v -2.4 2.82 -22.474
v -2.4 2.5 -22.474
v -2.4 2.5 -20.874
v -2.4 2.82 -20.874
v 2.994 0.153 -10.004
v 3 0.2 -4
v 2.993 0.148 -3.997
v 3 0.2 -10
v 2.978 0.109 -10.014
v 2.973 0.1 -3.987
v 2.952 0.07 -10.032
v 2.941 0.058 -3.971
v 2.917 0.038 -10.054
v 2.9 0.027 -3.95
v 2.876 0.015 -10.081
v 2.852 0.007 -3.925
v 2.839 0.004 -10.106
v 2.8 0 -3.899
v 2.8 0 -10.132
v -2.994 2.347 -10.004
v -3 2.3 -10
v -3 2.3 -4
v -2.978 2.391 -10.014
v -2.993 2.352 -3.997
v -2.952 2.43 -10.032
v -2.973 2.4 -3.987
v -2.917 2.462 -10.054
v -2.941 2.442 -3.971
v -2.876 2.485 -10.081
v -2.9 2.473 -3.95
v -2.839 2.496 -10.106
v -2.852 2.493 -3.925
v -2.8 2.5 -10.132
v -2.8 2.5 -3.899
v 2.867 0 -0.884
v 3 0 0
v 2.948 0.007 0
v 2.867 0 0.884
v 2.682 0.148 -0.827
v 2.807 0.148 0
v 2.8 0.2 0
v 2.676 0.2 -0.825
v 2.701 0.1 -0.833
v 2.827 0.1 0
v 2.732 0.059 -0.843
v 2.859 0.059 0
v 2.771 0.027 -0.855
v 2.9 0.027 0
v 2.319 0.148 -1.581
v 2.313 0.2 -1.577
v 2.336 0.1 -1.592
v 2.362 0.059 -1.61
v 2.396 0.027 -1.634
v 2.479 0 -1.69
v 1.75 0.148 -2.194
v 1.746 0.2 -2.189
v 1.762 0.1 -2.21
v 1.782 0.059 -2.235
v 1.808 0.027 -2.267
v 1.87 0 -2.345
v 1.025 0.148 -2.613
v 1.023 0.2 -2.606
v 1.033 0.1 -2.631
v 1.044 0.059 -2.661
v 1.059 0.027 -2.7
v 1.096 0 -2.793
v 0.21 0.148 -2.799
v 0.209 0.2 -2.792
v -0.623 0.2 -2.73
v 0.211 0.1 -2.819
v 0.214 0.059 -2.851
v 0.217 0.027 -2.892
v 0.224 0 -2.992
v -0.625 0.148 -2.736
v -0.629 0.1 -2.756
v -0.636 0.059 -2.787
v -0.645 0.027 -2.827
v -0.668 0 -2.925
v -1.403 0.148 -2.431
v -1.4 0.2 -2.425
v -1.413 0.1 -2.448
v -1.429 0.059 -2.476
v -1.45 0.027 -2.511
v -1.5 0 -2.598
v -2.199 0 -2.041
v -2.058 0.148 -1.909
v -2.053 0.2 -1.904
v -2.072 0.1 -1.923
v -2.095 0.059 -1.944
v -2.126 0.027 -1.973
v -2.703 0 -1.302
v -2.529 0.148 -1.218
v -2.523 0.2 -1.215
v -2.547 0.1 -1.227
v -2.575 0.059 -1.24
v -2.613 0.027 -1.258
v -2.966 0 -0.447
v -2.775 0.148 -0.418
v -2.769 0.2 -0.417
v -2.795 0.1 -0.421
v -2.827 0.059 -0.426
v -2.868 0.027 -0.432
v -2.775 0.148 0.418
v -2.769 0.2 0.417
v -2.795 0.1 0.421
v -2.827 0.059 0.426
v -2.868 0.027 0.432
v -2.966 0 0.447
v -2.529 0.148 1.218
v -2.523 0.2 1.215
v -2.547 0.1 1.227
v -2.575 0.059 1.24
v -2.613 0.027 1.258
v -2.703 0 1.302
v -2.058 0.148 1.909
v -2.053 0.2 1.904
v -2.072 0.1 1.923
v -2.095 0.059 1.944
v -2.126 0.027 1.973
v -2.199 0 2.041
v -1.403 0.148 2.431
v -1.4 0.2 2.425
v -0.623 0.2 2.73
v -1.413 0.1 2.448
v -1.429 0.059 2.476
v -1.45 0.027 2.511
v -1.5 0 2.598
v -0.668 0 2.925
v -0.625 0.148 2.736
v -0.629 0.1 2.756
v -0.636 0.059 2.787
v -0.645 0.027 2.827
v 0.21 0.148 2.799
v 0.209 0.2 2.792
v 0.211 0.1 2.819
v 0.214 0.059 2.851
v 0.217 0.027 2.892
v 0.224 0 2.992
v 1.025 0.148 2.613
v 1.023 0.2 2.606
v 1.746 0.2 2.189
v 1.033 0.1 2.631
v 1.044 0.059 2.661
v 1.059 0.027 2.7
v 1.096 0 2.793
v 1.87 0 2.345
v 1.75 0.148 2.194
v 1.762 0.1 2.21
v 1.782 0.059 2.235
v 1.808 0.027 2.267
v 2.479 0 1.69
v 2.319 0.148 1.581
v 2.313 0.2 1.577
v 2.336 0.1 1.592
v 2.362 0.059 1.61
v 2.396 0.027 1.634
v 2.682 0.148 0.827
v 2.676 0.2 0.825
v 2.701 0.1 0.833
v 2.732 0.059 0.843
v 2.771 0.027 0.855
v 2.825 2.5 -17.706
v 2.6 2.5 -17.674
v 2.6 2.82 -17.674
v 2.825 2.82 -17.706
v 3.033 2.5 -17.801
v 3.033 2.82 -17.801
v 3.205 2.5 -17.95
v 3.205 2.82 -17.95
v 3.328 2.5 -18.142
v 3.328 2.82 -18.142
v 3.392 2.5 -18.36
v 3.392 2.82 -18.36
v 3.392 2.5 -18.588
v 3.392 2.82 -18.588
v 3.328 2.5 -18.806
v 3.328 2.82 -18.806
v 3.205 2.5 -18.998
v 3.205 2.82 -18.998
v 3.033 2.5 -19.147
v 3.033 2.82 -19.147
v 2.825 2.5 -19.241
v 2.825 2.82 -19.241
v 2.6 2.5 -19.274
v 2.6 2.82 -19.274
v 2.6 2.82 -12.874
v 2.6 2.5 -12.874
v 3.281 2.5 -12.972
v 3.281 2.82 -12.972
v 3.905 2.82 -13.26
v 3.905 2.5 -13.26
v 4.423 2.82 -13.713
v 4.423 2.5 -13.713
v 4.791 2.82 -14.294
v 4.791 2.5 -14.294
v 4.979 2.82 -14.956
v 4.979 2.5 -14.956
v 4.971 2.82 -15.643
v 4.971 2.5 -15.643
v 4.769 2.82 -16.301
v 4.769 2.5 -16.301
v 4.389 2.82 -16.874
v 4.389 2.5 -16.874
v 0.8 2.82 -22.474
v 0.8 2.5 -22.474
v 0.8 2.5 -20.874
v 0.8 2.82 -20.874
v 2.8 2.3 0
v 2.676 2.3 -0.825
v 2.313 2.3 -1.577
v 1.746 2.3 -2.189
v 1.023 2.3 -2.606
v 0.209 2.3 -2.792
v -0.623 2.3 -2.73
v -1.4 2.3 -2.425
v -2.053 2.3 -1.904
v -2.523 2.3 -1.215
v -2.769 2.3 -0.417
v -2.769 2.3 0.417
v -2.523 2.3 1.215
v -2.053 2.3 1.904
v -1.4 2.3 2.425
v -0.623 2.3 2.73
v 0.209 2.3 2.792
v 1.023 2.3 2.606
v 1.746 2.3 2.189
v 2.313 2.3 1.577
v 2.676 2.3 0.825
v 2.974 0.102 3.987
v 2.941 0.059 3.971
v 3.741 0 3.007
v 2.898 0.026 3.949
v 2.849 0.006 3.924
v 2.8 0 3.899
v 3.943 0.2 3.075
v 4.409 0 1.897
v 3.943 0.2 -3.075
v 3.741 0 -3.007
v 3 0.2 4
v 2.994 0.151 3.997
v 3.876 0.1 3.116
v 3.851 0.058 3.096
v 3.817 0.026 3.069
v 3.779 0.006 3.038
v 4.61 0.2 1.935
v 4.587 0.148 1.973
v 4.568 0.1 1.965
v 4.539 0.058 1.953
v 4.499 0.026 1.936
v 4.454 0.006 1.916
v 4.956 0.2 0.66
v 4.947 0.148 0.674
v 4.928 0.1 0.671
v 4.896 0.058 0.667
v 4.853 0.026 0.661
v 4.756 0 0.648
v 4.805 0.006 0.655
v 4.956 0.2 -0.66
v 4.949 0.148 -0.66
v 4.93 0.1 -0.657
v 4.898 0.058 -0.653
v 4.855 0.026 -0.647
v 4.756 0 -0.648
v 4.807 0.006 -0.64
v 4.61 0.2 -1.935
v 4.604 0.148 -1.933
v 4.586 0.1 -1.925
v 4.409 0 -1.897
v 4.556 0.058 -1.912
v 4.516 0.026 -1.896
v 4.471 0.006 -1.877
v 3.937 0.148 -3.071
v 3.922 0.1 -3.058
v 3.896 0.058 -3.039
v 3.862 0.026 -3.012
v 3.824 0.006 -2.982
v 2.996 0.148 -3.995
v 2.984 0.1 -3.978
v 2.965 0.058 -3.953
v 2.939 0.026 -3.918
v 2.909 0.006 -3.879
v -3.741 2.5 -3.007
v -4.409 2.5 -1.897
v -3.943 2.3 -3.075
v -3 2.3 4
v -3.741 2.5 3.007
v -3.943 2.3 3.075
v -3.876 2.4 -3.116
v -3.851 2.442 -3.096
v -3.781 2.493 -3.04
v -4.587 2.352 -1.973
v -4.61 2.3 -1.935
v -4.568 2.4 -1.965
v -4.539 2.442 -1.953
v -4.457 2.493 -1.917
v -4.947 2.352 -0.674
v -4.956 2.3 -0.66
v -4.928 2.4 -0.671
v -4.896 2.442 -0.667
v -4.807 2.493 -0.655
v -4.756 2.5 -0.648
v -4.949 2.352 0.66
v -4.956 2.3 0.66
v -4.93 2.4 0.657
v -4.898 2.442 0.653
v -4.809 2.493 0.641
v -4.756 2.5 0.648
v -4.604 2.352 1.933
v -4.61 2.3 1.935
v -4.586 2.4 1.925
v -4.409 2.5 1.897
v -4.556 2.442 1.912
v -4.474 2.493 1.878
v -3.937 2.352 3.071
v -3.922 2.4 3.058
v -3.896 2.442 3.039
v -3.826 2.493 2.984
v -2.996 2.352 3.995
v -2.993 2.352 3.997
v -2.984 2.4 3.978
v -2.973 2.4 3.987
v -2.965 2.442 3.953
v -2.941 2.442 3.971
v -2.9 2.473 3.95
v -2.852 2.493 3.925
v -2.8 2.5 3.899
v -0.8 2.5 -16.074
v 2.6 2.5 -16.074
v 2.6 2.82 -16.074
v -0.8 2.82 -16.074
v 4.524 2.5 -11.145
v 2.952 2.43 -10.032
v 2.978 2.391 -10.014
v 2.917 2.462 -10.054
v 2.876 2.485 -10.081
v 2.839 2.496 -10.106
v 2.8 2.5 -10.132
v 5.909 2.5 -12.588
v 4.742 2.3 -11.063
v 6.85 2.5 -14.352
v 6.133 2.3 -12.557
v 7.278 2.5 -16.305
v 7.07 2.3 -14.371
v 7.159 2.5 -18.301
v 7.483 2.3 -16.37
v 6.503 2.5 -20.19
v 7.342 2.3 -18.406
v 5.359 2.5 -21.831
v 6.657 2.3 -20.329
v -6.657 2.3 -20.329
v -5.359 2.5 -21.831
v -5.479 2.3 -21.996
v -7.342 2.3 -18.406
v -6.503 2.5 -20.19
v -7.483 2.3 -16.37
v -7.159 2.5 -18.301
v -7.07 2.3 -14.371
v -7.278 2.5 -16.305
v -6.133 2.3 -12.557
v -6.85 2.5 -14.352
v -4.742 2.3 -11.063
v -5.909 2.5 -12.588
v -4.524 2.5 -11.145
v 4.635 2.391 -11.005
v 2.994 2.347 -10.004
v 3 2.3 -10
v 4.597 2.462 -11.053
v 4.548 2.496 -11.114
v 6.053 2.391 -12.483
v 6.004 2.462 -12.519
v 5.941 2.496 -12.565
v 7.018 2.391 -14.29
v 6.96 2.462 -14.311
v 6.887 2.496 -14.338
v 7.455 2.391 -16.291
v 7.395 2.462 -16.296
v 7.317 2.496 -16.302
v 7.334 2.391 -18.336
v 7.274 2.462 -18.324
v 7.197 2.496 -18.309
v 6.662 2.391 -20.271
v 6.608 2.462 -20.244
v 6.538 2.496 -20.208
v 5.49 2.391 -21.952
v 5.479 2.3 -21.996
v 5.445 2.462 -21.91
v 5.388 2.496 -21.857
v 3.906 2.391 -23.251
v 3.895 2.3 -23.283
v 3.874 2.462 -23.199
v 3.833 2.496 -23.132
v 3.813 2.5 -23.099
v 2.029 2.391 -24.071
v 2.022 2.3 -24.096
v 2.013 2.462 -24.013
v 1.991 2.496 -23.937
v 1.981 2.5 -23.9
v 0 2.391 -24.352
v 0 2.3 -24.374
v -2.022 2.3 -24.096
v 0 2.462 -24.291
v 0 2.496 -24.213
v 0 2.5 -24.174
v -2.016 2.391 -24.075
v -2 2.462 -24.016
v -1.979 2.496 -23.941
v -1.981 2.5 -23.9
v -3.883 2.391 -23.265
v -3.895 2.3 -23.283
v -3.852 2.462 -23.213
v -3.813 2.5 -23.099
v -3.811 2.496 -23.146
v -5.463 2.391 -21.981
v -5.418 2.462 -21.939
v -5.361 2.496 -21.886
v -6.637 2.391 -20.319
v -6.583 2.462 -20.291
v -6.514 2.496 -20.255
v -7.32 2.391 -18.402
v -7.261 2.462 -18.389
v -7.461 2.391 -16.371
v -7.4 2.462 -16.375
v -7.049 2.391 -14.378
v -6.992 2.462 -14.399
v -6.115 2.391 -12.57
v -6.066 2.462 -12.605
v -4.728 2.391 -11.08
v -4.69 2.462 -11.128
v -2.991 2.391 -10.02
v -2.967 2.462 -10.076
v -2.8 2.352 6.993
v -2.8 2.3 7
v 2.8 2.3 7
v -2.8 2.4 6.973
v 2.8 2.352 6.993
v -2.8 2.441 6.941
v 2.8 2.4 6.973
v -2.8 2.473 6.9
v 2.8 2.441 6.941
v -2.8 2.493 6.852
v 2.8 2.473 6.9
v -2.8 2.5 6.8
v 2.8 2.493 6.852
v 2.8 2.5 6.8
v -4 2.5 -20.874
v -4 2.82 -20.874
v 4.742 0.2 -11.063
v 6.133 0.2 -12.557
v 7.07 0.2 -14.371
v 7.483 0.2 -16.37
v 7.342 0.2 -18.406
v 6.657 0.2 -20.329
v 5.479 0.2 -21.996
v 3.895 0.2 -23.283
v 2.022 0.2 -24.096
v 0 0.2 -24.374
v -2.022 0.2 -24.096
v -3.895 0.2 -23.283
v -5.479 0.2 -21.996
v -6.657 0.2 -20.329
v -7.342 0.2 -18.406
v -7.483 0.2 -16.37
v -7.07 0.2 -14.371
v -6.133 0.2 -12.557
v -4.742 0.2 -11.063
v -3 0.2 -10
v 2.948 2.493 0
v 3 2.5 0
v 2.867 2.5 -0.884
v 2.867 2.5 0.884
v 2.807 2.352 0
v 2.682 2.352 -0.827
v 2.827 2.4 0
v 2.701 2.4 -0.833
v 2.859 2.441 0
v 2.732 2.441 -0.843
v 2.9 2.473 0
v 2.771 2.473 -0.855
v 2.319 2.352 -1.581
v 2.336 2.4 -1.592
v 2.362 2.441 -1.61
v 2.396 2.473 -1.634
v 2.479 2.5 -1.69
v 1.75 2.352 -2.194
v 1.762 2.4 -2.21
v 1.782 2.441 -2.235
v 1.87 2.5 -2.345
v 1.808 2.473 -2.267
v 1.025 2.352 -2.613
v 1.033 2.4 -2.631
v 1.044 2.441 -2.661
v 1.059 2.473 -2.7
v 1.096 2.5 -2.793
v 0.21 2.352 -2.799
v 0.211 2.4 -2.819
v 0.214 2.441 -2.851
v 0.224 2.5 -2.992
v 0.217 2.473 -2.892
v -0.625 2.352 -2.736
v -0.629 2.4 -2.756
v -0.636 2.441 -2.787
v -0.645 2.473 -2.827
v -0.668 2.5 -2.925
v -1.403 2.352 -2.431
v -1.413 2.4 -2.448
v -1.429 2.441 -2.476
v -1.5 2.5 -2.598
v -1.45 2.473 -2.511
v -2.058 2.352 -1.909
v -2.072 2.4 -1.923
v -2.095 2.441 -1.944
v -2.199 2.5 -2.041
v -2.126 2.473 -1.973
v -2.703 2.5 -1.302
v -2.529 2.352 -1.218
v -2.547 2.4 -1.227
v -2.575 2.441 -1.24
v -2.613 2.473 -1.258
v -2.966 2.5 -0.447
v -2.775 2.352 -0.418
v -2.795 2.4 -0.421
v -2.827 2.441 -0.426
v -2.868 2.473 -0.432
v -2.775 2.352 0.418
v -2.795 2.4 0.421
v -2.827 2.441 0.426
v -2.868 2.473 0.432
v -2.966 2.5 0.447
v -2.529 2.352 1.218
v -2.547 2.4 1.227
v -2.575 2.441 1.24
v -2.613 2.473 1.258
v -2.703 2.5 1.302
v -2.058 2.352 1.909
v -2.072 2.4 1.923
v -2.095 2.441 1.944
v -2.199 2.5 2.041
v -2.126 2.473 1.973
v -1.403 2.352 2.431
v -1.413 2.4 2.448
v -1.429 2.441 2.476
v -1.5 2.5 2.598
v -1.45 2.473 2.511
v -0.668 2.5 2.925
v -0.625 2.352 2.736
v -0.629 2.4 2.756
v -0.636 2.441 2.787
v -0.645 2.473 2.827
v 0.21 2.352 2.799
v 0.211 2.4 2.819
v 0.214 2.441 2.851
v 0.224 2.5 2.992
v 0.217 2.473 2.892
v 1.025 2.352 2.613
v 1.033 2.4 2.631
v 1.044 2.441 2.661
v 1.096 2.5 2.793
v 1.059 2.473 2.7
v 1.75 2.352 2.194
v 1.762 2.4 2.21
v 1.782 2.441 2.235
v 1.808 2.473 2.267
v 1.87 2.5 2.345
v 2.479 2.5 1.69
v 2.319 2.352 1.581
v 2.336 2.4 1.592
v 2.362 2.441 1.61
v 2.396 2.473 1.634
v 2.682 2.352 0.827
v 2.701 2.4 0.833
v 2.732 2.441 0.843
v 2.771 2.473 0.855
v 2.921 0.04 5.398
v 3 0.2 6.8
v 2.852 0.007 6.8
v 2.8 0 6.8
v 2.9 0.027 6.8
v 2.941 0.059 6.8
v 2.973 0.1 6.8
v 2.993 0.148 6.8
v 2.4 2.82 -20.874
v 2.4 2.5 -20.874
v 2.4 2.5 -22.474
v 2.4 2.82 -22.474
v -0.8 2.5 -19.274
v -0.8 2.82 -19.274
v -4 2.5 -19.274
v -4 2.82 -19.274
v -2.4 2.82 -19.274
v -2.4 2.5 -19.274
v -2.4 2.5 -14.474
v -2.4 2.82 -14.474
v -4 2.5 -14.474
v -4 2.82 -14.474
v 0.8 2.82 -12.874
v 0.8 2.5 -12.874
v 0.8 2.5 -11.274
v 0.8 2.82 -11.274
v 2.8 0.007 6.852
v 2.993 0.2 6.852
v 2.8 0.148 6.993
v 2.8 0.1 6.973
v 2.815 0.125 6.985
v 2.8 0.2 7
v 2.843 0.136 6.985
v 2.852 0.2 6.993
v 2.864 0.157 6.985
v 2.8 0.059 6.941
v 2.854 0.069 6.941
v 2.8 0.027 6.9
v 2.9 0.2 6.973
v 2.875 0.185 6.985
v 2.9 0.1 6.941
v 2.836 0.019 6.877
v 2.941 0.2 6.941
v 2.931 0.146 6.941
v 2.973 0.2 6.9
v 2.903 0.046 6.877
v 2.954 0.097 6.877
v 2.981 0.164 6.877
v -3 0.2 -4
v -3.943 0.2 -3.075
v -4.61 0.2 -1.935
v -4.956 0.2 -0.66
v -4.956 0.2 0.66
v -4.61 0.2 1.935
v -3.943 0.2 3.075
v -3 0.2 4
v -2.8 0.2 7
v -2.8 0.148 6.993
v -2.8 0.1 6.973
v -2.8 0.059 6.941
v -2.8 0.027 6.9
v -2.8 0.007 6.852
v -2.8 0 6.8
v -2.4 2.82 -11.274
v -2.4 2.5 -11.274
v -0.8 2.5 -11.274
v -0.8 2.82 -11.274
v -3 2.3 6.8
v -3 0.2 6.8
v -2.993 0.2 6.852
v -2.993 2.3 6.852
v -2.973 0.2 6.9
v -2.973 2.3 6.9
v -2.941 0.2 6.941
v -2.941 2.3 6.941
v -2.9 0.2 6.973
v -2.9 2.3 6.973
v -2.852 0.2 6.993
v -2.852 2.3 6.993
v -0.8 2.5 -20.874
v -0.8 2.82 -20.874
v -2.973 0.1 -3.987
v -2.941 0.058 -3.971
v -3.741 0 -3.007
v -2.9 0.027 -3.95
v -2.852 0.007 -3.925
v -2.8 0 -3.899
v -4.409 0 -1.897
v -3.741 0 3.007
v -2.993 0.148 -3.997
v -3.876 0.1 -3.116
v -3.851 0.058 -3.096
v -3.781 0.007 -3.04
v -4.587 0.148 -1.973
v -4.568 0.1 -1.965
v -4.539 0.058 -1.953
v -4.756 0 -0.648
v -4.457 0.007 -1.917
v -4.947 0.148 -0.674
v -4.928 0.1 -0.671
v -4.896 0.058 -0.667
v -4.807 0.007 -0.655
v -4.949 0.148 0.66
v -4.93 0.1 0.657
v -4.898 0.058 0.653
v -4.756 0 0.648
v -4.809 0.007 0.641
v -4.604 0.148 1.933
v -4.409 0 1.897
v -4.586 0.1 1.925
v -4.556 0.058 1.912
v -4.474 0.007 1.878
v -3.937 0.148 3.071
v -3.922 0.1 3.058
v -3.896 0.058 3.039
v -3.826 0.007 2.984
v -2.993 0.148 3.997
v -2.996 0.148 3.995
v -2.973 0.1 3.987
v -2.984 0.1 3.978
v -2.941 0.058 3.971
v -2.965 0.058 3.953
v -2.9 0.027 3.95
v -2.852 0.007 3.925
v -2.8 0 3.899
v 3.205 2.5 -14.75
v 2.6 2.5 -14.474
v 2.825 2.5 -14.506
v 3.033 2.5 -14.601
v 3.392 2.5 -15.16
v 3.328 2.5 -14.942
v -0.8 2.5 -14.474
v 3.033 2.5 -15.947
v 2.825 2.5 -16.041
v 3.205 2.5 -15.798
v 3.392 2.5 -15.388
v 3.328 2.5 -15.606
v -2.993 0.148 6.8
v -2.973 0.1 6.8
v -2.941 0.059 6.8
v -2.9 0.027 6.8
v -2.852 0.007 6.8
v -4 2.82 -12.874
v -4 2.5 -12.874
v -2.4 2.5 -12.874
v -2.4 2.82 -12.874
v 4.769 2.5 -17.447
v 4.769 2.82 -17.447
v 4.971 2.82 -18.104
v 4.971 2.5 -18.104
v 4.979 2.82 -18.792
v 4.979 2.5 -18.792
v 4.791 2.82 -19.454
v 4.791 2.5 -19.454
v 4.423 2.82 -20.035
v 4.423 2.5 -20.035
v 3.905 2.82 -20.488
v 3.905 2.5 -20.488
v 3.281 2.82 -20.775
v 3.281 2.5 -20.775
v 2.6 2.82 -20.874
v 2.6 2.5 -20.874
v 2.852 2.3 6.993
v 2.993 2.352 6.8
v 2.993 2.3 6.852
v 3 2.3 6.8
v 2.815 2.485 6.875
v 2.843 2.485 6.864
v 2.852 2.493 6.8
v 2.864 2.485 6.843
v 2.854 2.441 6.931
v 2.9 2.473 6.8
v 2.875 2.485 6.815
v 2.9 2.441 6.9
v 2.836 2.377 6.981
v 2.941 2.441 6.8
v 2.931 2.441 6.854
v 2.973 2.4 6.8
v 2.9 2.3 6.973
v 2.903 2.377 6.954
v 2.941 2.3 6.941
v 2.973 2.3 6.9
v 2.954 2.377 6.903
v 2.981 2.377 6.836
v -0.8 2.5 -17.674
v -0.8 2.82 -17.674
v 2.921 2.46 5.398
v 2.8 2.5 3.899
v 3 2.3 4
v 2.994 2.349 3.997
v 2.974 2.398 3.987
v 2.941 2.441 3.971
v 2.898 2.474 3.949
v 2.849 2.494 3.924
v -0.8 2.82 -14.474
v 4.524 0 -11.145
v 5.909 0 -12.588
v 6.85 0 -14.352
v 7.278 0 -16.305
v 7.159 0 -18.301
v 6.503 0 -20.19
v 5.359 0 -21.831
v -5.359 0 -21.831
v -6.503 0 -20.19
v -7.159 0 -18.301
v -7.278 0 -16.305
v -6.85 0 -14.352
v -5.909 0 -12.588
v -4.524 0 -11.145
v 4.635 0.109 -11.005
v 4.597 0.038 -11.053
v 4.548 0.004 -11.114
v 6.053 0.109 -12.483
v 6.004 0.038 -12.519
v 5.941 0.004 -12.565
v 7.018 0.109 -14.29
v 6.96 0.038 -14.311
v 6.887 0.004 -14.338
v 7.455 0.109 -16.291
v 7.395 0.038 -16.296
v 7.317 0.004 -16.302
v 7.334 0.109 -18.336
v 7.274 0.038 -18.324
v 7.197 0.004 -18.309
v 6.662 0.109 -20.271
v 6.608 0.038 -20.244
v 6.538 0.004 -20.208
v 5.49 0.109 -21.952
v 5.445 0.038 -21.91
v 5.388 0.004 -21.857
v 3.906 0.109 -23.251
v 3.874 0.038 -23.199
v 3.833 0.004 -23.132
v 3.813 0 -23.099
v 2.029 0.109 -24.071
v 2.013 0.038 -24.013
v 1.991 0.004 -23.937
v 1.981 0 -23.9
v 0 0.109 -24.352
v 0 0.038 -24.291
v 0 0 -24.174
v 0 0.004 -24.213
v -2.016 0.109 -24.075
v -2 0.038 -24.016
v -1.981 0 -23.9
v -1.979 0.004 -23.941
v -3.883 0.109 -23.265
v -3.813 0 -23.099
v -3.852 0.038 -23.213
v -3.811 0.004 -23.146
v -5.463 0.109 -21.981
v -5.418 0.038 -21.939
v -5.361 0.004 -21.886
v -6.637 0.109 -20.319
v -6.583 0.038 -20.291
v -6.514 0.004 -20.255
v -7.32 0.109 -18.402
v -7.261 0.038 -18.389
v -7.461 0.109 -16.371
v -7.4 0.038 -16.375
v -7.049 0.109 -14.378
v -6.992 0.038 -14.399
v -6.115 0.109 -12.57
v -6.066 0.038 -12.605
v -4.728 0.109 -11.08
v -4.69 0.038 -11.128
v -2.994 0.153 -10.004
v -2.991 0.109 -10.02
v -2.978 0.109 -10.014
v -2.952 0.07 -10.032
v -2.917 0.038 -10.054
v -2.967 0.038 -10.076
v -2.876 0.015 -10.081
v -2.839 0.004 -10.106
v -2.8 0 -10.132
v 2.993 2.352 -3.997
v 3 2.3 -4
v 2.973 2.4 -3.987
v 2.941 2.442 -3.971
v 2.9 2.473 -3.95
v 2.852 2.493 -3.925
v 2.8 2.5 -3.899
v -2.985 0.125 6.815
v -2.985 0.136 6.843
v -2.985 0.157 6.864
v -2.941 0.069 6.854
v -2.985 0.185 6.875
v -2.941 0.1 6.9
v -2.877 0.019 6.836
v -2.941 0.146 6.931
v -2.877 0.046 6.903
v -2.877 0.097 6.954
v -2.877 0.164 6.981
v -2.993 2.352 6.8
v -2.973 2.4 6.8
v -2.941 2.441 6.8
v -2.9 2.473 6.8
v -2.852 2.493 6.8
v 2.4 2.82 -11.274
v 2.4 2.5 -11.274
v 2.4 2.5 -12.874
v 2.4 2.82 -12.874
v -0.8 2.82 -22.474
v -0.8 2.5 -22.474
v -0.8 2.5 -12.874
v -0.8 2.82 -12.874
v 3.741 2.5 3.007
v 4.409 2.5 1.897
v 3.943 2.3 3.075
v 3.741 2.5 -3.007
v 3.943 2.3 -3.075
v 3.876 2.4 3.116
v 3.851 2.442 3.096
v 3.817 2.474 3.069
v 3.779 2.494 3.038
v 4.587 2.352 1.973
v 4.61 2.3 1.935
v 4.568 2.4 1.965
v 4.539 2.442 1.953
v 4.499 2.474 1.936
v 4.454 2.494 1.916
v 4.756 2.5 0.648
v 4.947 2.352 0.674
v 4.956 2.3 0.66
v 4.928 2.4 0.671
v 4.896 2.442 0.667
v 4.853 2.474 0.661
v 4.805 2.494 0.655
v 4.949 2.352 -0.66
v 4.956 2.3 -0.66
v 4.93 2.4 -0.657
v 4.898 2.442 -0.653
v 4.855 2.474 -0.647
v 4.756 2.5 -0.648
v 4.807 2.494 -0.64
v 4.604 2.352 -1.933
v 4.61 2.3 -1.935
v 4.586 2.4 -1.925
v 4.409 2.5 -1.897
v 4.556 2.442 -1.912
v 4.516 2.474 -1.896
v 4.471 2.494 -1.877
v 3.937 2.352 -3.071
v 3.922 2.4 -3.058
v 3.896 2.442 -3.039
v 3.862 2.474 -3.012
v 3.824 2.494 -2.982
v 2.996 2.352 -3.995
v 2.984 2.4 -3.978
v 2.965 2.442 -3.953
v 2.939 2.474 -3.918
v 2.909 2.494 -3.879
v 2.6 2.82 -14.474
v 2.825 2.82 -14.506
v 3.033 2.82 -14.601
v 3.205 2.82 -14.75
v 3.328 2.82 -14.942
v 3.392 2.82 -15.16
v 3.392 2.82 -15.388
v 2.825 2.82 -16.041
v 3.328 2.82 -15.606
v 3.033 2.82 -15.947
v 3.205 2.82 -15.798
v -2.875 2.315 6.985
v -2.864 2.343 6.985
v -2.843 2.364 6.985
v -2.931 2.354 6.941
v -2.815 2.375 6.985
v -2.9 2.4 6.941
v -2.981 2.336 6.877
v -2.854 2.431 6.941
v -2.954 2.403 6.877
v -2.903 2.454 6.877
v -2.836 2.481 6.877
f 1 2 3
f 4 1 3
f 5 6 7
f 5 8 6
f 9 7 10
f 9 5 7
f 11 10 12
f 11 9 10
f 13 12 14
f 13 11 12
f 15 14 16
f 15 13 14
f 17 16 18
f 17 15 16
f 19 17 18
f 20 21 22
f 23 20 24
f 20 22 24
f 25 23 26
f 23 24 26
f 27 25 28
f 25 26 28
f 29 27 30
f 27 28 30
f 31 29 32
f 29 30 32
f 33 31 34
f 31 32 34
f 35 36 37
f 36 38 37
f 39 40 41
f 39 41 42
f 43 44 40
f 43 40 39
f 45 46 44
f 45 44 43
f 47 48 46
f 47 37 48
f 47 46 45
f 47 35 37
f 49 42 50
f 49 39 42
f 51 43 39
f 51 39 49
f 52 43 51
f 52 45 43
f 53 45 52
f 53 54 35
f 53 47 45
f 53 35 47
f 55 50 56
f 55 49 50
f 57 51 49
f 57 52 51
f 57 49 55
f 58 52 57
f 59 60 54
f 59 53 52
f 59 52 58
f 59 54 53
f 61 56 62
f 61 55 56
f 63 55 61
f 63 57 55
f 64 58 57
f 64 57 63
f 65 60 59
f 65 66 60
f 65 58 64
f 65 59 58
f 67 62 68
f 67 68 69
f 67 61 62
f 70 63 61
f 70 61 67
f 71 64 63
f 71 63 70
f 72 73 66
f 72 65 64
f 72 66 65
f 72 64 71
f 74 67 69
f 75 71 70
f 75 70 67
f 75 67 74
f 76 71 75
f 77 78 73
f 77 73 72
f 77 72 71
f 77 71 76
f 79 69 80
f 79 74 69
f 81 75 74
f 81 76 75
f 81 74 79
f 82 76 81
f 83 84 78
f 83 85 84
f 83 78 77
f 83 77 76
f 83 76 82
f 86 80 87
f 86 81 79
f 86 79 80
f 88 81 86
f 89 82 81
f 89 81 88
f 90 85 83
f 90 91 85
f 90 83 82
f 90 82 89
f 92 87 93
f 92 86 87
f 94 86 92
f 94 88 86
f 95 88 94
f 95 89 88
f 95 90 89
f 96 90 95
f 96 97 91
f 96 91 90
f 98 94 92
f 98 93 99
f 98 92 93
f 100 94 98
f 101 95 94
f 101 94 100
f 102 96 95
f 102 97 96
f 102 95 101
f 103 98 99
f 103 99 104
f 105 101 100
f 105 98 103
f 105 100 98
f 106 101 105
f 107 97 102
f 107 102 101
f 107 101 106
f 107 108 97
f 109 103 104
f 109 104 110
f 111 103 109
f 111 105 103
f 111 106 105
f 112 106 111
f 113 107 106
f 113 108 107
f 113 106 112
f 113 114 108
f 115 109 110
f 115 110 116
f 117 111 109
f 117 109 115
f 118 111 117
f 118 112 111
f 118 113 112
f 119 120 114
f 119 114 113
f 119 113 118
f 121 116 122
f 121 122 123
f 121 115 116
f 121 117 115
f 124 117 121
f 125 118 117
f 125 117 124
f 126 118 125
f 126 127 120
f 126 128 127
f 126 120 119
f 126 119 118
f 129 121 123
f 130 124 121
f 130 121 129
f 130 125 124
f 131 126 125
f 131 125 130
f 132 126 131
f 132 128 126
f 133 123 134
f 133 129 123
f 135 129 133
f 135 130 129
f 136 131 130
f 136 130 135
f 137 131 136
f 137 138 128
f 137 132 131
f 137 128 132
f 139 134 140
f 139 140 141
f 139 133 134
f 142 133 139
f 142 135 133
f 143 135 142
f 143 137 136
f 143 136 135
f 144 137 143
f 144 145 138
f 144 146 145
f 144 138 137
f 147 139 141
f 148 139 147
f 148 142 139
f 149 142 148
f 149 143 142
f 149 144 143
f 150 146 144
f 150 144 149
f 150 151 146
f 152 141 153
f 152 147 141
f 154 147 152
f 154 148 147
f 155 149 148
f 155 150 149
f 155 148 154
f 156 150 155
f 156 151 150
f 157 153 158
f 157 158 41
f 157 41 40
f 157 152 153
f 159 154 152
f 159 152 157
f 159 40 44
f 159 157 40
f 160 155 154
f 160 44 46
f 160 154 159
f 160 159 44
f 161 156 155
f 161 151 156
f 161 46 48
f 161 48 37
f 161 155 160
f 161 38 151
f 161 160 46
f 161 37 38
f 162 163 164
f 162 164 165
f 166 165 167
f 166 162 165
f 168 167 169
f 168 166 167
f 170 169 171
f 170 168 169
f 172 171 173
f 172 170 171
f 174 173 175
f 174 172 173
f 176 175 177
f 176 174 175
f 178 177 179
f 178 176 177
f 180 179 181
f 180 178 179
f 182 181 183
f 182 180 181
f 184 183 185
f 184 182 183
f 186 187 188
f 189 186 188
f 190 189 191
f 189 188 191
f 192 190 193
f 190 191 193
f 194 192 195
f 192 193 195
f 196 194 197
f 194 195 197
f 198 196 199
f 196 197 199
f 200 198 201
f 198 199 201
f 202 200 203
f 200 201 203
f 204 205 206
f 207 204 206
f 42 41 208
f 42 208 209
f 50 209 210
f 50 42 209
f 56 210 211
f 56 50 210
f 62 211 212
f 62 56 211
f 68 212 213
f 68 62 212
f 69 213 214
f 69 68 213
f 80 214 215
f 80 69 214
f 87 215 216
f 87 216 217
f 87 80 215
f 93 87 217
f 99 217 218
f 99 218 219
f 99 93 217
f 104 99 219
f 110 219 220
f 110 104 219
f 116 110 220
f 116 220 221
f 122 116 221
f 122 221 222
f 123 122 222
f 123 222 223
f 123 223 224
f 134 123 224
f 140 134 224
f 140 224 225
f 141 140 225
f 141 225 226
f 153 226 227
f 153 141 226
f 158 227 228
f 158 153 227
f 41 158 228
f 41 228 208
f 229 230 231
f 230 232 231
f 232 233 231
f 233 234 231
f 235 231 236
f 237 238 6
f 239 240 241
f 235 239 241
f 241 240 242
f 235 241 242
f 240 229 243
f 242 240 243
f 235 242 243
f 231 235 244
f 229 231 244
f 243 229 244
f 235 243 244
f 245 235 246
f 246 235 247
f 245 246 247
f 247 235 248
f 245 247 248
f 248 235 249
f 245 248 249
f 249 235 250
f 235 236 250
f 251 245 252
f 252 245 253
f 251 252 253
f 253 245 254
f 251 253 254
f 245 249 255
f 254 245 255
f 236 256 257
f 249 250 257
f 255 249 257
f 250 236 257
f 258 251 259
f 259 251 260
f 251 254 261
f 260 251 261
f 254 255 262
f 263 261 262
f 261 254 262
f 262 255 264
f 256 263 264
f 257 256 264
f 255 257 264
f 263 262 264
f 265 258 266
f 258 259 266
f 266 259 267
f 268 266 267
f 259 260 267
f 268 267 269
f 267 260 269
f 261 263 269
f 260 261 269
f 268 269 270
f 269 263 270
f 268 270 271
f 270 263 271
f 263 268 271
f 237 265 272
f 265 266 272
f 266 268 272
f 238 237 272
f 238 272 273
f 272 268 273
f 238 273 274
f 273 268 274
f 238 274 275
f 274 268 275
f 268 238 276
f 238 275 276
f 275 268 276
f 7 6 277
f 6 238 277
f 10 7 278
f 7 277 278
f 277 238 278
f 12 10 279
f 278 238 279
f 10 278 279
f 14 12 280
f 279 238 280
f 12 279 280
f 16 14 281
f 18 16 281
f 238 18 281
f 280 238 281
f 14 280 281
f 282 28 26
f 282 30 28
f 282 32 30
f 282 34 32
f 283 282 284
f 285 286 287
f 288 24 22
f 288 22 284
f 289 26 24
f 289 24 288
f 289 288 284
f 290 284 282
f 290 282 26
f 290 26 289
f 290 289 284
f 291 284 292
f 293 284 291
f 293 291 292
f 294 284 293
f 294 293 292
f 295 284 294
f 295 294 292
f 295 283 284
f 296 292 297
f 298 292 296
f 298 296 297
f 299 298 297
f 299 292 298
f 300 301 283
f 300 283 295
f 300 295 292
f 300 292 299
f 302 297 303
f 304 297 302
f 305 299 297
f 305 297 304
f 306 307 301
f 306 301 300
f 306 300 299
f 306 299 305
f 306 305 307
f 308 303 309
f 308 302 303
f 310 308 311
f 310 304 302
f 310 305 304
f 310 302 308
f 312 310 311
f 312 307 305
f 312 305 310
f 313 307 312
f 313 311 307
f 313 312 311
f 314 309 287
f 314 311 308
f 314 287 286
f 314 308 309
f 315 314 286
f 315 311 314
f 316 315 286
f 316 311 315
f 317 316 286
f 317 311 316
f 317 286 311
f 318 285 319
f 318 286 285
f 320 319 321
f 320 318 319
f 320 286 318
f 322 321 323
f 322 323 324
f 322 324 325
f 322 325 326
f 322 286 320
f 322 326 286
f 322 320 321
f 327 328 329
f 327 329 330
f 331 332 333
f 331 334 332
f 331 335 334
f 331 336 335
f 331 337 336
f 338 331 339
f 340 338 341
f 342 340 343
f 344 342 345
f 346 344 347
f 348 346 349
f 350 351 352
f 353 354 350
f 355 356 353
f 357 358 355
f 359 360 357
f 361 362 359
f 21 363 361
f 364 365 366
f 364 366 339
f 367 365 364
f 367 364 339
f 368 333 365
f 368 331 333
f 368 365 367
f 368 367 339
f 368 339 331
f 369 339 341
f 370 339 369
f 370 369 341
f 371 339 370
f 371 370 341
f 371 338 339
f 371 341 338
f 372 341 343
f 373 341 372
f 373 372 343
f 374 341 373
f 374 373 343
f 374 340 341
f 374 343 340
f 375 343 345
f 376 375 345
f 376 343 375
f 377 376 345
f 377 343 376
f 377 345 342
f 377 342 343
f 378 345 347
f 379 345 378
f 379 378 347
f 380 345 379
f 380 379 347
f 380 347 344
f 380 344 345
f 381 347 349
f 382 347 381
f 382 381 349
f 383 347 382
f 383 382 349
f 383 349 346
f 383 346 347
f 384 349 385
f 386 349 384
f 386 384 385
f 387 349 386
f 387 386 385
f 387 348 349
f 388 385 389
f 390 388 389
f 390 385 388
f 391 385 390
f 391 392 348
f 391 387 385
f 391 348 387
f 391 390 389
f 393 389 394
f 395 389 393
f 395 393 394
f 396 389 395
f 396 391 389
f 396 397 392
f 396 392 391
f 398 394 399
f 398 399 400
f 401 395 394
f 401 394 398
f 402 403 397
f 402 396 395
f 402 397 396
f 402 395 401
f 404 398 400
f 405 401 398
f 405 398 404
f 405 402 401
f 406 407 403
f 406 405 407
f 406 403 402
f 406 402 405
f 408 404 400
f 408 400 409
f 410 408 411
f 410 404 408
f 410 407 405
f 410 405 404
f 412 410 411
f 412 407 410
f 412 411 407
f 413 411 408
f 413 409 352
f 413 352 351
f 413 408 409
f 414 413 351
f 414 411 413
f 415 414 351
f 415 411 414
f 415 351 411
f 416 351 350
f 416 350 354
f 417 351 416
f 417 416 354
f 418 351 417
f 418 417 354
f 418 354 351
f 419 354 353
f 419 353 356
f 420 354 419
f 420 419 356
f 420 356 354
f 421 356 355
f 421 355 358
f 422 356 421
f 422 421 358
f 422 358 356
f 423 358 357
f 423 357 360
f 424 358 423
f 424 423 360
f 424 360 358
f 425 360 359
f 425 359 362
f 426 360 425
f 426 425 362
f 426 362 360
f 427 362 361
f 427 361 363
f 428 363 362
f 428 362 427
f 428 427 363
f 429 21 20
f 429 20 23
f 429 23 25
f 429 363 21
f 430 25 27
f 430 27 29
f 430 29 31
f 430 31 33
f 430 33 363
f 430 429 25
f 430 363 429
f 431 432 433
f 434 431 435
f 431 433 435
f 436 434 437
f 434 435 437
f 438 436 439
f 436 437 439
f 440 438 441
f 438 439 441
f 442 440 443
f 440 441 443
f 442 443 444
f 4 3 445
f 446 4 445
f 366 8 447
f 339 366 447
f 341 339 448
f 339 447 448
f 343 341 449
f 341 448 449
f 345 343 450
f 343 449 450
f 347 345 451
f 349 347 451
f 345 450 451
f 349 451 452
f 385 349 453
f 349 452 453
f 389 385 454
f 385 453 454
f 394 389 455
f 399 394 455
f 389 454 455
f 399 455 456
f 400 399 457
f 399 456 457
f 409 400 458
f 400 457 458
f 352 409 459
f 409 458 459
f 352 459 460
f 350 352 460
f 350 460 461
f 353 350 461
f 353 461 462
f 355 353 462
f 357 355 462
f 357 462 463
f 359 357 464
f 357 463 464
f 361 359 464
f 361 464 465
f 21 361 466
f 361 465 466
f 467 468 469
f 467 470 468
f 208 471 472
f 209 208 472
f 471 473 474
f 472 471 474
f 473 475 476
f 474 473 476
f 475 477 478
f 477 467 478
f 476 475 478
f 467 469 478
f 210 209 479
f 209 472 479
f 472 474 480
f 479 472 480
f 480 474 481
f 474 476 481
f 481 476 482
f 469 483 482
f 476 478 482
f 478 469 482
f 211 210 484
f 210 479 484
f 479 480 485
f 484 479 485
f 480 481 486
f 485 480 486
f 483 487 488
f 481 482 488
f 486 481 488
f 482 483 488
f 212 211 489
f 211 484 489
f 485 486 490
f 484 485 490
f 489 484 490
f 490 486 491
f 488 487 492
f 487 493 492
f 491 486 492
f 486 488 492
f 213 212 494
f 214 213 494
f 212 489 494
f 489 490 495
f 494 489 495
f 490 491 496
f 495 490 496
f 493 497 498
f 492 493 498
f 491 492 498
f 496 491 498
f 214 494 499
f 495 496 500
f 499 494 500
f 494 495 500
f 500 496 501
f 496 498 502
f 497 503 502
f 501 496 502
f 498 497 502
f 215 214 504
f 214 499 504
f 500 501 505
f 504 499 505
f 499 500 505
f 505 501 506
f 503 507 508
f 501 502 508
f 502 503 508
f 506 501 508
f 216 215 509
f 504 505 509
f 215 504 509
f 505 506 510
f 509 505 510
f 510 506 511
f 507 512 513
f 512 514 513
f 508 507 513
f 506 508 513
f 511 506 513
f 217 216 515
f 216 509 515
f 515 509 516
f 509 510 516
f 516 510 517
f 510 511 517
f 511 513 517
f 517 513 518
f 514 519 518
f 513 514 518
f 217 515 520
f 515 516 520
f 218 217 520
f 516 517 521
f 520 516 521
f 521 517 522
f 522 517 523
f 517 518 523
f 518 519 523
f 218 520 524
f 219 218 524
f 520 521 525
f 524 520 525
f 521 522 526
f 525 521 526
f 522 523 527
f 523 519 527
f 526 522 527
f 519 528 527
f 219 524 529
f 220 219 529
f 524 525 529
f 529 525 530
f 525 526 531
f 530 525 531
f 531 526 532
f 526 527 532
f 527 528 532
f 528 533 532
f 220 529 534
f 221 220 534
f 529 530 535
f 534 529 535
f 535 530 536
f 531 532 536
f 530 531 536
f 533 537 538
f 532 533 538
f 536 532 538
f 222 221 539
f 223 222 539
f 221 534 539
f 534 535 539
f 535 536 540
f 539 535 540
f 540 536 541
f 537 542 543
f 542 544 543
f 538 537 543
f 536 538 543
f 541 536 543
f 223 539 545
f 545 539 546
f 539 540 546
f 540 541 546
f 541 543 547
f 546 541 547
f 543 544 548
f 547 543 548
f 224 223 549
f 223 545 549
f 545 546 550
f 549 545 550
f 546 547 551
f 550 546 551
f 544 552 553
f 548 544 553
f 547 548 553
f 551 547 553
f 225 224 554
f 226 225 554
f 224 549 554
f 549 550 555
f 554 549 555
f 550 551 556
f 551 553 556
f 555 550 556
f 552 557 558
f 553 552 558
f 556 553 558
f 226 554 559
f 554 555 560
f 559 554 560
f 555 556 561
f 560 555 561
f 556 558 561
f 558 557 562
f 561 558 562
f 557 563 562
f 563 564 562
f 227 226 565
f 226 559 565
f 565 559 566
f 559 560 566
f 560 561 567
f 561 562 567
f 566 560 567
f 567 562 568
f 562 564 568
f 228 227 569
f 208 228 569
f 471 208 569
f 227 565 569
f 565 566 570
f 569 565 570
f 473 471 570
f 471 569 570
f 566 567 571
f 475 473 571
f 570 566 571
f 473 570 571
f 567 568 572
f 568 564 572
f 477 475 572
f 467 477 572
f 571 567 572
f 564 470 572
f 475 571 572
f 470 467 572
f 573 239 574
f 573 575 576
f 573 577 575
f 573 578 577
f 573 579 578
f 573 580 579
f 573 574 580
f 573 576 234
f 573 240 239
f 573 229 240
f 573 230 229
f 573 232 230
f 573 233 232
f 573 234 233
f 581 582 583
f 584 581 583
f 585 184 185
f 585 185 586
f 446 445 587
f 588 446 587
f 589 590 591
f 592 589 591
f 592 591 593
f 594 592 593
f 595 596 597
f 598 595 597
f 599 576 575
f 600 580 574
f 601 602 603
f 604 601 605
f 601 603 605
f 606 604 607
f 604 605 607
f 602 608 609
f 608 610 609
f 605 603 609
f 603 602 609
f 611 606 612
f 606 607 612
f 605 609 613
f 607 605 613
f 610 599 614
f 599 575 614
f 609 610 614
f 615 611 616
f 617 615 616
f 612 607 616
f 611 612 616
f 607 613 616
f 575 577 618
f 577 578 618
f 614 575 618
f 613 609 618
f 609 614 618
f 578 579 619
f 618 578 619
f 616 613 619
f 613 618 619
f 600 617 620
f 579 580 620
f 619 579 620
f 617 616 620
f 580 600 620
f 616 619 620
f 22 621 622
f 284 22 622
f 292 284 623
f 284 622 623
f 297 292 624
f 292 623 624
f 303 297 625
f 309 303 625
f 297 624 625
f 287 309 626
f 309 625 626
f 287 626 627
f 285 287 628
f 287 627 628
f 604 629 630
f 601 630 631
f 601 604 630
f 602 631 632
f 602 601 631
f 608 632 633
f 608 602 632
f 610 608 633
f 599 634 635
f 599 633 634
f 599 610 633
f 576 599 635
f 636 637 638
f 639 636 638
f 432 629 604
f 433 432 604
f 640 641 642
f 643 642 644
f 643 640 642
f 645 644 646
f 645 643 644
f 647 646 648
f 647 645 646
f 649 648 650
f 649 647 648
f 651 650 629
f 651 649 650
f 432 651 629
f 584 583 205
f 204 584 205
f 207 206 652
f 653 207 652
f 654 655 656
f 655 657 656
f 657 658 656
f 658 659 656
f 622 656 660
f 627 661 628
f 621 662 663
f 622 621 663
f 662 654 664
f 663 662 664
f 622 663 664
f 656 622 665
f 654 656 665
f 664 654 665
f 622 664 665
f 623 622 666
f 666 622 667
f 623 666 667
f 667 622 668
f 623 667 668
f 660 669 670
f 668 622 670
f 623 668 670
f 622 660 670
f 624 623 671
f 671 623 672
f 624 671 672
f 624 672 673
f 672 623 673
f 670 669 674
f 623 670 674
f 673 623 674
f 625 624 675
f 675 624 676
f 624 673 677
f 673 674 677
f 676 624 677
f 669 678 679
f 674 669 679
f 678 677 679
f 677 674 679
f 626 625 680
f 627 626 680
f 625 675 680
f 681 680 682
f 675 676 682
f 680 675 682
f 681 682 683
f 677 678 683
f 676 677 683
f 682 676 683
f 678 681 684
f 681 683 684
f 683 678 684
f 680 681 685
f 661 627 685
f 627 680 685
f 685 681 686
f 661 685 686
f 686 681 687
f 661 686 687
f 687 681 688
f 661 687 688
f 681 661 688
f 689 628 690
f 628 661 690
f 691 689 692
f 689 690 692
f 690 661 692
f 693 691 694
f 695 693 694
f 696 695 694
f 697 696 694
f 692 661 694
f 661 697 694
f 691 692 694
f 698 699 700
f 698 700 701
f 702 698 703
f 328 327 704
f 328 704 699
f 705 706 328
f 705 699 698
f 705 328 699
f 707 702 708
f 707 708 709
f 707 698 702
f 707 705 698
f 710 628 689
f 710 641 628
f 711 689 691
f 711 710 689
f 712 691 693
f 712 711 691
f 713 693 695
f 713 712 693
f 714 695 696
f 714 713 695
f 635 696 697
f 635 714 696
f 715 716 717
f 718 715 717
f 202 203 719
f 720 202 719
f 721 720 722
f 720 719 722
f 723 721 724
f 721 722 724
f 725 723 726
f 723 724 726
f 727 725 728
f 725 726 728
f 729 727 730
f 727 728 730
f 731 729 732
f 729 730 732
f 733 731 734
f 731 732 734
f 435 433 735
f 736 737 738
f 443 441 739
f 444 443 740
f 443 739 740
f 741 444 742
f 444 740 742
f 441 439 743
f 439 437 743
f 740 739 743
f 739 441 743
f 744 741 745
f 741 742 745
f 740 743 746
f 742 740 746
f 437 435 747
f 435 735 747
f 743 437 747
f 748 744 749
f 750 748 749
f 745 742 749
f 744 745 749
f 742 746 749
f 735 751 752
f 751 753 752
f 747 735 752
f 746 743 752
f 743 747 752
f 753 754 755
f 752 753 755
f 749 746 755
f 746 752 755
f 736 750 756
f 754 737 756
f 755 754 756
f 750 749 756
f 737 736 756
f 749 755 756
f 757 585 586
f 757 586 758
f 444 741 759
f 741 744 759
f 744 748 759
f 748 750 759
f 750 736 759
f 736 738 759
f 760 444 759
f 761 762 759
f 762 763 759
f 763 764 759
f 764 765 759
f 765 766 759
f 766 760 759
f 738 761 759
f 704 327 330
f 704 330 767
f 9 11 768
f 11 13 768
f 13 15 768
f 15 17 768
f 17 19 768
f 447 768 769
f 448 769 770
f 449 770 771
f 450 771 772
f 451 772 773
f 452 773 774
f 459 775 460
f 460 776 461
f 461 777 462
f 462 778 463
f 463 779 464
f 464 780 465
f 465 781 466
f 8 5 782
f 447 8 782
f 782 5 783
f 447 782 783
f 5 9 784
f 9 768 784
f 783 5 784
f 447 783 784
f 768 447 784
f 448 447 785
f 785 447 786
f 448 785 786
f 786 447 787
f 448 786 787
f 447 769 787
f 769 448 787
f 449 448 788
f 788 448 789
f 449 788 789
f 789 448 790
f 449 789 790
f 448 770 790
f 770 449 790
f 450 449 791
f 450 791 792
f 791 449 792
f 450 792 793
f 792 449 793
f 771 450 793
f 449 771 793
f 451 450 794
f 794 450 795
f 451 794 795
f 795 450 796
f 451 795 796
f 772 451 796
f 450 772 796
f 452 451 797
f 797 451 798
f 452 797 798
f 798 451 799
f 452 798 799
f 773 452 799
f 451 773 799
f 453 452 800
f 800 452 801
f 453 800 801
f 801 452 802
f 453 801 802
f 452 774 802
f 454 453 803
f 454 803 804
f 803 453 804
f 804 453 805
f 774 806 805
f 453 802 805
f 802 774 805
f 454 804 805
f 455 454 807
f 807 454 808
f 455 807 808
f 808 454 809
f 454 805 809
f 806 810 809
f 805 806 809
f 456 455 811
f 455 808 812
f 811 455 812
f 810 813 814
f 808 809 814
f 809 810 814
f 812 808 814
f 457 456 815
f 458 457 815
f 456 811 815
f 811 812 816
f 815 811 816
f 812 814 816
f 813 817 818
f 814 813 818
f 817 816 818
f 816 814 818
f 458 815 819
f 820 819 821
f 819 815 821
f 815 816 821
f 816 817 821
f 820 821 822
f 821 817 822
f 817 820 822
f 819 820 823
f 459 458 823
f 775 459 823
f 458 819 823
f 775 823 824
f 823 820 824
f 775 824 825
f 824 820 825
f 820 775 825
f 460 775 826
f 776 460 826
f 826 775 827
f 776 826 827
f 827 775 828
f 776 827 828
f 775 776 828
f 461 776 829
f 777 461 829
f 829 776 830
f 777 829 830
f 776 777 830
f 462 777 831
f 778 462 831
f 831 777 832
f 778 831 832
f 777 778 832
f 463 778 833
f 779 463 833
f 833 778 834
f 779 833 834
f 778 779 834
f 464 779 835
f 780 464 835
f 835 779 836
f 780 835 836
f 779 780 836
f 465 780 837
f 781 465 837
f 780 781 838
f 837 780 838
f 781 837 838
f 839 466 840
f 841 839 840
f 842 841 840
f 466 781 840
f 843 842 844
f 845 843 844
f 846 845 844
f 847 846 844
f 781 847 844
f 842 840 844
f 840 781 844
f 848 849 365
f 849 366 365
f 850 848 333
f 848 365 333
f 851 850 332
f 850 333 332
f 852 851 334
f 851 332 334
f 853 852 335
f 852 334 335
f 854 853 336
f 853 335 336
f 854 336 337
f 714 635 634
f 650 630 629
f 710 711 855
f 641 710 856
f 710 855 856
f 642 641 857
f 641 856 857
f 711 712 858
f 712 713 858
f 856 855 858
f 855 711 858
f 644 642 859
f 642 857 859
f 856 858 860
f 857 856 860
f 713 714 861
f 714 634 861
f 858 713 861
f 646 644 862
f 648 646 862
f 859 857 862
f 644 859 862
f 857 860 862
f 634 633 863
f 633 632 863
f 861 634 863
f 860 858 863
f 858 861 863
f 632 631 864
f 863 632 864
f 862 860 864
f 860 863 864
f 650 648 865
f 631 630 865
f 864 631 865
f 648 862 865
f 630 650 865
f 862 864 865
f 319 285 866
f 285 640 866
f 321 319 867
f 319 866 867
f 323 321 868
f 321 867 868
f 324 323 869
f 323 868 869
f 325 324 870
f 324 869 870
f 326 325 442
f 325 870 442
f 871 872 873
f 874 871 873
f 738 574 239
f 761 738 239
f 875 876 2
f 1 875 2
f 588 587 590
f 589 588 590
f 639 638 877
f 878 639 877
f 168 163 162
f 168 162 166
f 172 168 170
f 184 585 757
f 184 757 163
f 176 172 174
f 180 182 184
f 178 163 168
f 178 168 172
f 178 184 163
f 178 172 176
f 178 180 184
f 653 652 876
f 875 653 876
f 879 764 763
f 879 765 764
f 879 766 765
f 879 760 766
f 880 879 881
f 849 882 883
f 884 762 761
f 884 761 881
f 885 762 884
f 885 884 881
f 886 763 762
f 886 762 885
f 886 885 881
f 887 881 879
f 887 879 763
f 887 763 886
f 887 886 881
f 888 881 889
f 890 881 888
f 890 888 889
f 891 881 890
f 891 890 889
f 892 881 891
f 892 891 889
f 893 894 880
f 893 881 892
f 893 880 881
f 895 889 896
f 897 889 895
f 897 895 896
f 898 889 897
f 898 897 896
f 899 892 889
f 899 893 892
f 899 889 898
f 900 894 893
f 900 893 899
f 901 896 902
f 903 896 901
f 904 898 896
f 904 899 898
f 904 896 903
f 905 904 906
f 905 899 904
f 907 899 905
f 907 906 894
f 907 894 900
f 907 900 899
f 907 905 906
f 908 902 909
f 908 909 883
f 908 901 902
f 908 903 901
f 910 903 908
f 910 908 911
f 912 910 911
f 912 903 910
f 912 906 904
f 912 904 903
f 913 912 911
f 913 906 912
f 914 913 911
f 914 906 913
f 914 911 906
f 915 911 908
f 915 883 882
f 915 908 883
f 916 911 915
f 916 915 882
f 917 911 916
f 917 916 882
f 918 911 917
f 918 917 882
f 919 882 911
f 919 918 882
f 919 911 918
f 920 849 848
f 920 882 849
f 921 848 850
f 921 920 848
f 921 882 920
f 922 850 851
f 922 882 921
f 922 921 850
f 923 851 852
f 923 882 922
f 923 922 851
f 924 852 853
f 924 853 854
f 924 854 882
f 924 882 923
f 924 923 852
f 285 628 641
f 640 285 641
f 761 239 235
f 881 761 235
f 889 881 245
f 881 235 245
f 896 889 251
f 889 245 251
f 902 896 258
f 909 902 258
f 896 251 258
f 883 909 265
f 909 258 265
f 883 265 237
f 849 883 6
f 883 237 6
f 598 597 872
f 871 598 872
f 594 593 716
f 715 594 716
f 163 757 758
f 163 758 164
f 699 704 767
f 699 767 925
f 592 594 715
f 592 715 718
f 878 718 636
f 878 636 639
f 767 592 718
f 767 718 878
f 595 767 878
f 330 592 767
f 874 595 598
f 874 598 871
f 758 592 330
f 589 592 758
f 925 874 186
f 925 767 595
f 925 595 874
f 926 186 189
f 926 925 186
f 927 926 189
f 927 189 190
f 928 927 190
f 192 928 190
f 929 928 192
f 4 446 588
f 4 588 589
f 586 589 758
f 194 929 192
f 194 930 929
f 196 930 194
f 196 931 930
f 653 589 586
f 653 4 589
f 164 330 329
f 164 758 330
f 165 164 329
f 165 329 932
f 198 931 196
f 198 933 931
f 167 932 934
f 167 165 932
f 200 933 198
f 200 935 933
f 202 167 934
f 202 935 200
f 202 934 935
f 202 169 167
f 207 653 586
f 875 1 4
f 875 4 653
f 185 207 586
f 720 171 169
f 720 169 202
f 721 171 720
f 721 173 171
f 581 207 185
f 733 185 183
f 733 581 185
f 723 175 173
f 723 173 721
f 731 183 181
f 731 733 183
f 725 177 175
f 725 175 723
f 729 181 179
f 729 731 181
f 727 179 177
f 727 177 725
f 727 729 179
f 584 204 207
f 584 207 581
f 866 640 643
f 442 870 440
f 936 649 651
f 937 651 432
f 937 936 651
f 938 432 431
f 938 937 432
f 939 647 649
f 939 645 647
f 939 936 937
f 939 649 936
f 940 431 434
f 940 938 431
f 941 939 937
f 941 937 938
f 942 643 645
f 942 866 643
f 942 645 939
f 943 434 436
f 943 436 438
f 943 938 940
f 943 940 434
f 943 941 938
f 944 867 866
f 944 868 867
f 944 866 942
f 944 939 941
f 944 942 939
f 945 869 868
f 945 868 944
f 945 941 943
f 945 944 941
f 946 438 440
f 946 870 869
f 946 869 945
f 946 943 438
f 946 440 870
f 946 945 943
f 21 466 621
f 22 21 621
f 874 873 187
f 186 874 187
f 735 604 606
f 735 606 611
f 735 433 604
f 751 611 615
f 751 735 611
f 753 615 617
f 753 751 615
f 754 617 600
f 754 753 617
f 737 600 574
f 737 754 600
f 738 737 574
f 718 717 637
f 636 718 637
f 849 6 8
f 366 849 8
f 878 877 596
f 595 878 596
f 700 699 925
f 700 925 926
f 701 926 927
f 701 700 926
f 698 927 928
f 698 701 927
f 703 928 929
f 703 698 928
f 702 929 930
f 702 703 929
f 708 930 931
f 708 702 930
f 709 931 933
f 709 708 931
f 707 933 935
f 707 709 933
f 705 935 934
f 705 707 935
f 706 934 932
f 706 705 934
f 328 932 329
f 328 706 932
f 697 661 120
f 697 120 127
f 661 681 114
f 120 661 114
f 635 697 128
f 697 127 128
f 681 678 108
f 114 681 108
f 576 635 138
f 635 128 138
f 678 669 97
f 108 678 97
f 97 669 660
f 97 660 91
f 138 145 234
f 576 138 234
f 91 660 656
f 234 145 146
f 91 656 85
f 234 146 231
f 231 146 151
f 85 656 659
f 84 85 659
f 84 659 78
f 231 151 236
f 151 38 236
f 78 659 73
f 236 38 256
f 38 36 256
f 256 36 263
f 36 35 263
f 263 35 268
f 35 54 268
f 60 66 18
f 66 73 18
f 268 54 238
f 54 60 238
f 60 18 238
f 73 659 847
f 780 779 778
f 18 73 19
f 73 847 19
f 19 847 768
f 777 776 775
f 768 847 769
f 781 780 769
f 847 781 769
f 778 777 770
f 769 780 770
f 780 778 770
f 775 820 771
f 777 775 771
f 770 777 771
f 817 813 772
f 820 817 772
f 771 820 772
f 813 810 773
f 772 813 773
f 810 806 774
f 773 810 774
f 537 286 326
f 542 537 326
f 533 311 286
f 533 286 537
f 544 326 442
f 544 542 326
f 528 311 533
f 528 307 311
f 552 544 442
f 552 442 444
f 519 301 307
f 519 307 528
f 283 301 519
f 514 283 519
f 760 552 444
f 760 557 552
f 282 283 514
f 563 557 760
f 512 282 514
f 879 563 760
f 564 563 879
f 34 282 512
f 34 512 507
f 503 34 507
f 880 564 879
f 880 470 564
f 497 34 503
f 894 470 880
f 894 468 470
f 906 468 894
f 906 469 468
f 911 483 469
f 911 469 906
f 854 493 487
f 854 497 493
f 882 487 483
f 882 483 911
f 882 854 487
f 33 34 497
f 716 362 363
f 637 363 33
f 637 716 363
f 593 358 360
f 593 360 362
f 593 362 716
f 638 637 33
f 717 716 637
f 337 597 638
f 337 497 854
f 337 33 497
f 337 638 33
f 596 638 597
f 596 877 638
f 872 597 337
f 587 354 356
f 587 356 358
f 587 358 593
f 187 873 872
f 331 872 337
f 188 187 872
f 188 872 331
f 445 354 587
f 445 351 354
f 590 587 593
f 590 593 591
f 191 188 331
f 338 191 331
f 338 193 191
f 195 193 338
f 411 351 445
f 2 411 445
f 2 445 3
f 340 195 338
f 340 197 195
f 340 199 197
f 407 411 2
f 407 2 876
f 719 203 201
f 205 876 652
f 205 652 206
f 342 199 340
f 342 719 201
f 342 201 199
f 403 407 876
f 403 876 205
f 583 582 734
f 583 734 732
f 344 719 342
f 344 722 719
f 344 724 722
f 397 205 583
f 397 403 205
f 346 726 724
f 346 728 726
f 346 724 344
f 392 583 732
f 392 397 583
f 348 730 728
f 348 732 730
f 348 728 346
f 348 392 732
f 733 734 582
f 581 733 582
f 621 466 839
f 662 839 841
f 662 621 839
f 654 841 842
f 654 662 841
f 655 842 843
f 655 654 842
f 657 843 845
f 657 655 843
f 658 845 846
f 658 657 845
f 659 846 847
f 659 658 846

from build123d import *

# Parameters (mm, degrees)
SKETCH_4_R      = 2.8
EXTRUDE_2_DEPTH = 2.5
FILLET_1_R      = 0.2
EXTRUDE_3_DEPTH = 0.32


with BuildPart() as part:
    # 草图4 → 凸台-拉伸2 (new body)
    with BuildSketch(Plane(origin=(0, 0, 0), x_dir=(1, 0, 0), z_dir=(0, 1, 0))):
        with BuildLine():
            Line((-3, 10), (-3, 4))
            ThreePointArc((-3, 4), (-5, 0), (-3, -4))
            Line((-3, -4), (-3, -7))
            Line((-3, -7), (3, -7))
            Line((3, -7), (3, -4))
            ThreePointArc((3, -4), (5, 0), (3, 4))
            Line((3, 4), (3, 10))
            ThreePointArc((3, 10), (0, 24.373863542), (-3, 10))
        make_face()
        Circle(SKETCH_4_R, mode=Mode.SUBTRACT)
    extrude(amount=EXTRUDE_2_DEPTH)

    # 圆角1
    fillet_1_edges = [part.edges().sort_by_distance(p)[0] for p in [
        (-2.8, 0, 0),
        (-5, 2.5, 0),
        (0, 0, -24.373863542),
        (3, 0, -7),
        (5, 0, 0),
        (3, 0, 5.5),
        (0, 0, 7),
        (-3, 0, 5.5),
        (-5, 0, 0),
        (-3, 0, -7),
        (-3, 2.5, 5.5),
        (3, 1.25, 7),
        (-3, 1.25, 7),
        (0, 2.5, 7),
        (3, 2.5, 5.5),
        (5, 2.5, 0),
        (3, 2.5, -7),
        (0, 2.5, -24.373863542),
        (-2.8, 2.5, 0),
        (-3, 2.5, -7),
    ]]
    fillet(fillet_1_edges, radius=FILLET_1_R)

    # 草图1 → 凸台-拉伸3 (add)
    with BuildSketch(Plane(origin=(0, 2.5, 0), x_dir=(1, 0, 0), z_dir=(0, 1, 0))):
        with BuildLine():
            Line((-0.8, 22.473863542), (-2.4, 22.473863542))
            Line((-2.4, 22.473863542), (-2.4, 20.873863542))
            Line((-2.4, 20.873863542), (-4, 20.873863542))
            Line((-4, 20.873863542), (-4, 19.273863542))
            Line((-4, 19.273863542), (-2.4, 19.273863542))
            Line((-2.4, 19.273863542), (-2.4, 14.473863542))
            Line((-2.4, 14.473863542), (-4, 14.473863542))
            Line((-4, 14.473863542), (-4, 12.873863542))
            Line((-4, 12.873863542), (-2.4, 12.873863542))
            Line((-2.4, 12.873863542), (-2.4, 11.273863542))
            Line((-2.4, 11.273863542), (-0.8, 11.273863542))
            Line((-0.8, 11.273863542), (-0.8, 12.873863542))
            Line((-0.8, 12.873863542), (0.8, 12.873863542))
            Line((0.8, 12.873863542), (0.8, 11.273863542))
            Line((0.8, 11.273863542), (2.4, 11.273863542))
            Line((2.4, 11.273863542), (2.4, 12.873863542))
            Line((2.4, 12.873863542), (2.6, 12.873863542))
            ThreePointArc((2.6, 12.873863542), (4.79089023, 14.294067645), (4.388854382, 16.873863542))
            ThreePointArc((4.388854382, 16.873863542), (4.79089023, 19.45365944), (2.6, 20.873863542))
            Line((2.6, 20.873863542), (2.4, 20.873863542))
            Line((2.4, 20.873863542), (2.4, 22.473863542))
            Line((2.4, 22.473863542), (0.8, 22.473863542))
            Line((0.8, 22.473863542), (0.8, 20.873863542))
            Line((0.8, 20.873863542), (-0.8, 20.873863542))
            Line((-0.8, 20.873863542), (-0.8, 22.473863542))
        make_face()
        with BuildLine():
            Line((-0.8, 17.673863542), (2.6, 17.673863542))
            ThreePointArc((2.6, 17.673863542), (3.4, 18.473863542), (2.6, 19.273863542))
            Line((2.6, 19.273863542), (-0.8, 19.273863542))
            Line((-0.8, 19.273863542), (-0.8, 17.673863542))
        make_face(mode=Mode.SUBTRACT)
        with BuildLine():
            Line((2.6, 16.073863542), (-0.8, 16.073863542))
            Line((-0.8, 16.073863542), (-0.8, 14.473863542))
            Line((-0.8, 14.473863542), (2.6, 14.473863542))
            ThreePointArc((2.6, 14.473863542), (3.4, 15.273863542), (2.6, 16.073863542))
        make_face(mode=Mode.SUBTRACT)
    extrude(amount=EXTRUDE_3_DEPTH)


solid = part.part
